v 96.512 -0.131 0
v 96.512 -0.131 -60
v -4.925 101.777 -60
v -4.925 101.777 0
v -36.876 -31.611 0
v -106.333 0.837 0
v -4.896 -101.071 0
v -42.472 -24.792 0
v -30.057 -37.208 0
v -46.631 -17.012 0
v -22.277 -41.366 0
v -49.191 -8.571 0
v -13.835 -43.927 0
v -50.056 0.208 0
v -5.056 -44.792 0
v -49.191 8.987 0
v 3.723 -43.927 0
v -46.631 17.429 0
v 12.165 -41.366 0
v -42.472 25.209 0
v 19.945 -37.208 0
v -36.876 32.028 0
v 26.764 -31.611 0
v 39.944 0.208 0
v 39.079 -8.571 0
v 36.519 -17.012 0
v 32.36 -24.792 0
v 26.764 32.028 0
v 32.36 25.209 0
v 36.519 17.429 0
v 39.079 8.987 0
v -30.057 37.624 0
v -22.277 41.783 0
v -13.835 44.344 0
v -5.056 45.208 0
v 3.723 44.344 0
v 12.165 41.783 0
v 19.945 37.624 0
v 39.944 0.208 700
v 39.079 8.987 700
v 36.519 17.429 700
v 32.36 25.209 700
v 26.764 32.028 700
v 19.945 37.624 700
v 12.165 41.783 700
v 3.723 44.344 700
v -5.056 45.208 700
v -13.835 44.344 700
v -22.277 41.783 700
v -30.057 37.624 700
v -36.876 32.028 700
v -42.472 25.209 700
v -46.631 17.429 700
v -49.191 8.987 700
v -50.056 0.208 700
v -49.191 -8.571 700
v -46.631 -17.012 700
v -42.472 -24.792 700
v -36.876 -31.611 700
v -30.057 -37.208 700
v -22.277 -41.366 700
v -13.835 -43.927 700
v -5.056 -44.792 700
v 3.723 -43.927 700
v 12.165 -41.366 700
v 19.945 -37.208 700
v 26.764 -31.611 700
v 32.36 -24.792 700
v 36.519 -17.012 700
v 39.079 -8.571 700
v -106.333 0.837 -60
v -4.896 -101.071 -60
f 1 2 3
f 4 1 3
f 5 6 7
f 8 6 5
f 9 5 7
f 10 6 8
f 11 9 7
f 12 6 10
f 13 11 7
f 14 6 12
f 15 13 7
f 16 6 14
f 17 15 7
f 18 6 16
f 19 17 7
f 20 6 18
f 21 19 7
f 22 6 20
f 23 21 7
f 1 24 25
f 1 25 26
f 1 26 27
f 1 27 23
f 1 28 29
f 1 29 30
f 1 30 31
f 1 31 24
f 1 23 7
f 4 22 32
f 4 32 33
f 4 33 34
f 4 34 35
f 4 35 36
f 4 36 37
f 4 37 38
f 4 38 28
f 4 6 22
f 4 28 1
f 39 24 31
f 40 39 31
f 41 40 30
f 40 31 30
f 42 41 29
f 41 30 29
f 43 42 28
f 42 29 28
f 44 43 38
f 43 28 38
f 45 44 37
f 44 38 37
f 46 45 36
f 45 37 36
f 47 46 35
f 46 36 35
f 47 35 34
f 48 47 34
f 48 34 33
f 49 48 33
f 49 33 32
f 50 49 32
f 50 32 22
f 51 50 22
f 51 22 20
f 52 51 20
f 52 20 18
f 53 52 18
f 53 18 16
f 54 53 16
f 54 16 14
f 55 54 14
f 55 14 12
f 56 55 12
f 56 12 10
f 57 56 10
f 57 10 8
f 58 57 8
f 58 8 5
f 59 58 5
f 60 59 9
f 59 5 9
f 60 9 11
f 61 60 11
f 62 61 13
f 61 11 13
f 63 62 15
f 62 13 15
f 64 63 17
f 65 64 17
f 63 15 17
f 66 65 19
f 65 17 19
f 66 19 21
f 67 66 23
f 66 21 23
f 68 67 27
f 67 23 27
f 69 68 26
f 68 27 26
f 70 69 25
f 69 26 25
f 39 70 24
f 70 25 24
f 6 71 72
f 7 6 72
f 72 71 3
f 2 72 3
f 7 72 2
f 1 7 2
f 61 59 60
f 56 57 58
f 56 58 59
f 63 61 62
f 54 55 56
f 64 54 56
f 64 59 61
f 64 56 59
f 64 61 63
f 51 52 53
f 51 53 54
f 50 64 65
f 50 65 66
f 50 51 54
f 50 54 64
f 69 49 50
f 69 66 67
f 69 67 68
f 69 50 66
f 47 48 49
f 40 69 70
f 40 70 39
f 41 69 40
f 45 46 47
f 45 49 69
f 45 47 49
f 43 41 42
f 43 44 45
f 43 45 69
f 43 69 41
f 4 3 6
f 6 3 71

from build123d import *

# Parameters (mm, degrees)
ESQUISSE1_R        = 45
BOSS_EXTRU_8_DEPTH = 700
BOSS_EXTRU_9_START = 60
ESQUISSE6_R        = 45
BOSS_EXTRU_9_DEPTH = 60


with BuildPart() as part:
    # Esquisse1 → Boss.-Extru.8 (new body)
    with BuildSketch(Plane.XY):
        with Locations((-5.0559795, 0.208317709)):
            Circle(ESQUISSE1_R)
    extrude(amount=BOSS_EXTRU_8_DEPTH)

    # Esquisse6 → Boss.-Extru.9 (add)
    # profile 1 of 4: a face of its own
    with BuildSketch(Plane(origin=(0, 0, 0), x_dir=(-1, 0, 0), z_dir=(0, 0, -1)).offset(BOSS_EXTRU_9_START)):
        Polygon((4.92504327, 101.776708668), (106.333278208, 0.8368395), (4.896305663, -101.070805399), (-96.511929276, -0.13093623), align=None)
        with Locations((5.0559795, 0.208317709)):
            Circle(ESQUISSE6_R, mode=Mode.SUBTRACT)
    # profile 2 of 4: a face of its own
    with BuildSketch(Plane(origin=(0, 0, 0), x_dir=(-1, 0, 0), z_dir=(0, 0, -1)).offset(BOSS_EXTRU_9_START)):
        Polygon((5.0559795, 45.208317709), (49.764887249, 0.705903269), (4.765369432, -44.50241444), (-39.943538316, 0), align=None)
    # profile 3 of 4: a face of its own
    with BuildSketch(Plane(origin=(0, 0, 0), x_dir=(-1, 0, 0), z_dir=(0, 0, -1)).offset(BOSS_EXTRU_9_START)):
        with BuildLine():
            ThreePointArc((50.0559795, 0.208317709), (36.875784654, 32.028122862), (5.0559795, 45.208317709))
            Line((5.0559795, 45.208317709), (49.764887249, 0.705903269))
            Line((49.764887249, 0.705903269), (4.765369432, -44.50241444))
            Line((4.765369432, -44.50241444), (-39.943538316, 0))
            ThreePointArc((-39.943538316, 0), (5.160138634, -44.791561745), (50.0559795, 0.208317709))
        make_face()
    # profile 4 of 4: a face of its own
    with BuildSketch(Plane(origin=(0, 0, 0), x_dir=(-1, 0, 0), z_dir=(0, 0, -1)).offset(BOSS_EXTRU_9_START)):
        with BuildLine():
            Line((-39.943538316, 0), (5.0559795, 45.208317709))
            ThreePointArc((5.0559795, 45.208317709), (-26.837392044, 31.954385994), (-39.943538316, 0))
        make_face()
    extrude(amount=-BOSS_EXTRU_9_DEPTH)


solid = part.part
